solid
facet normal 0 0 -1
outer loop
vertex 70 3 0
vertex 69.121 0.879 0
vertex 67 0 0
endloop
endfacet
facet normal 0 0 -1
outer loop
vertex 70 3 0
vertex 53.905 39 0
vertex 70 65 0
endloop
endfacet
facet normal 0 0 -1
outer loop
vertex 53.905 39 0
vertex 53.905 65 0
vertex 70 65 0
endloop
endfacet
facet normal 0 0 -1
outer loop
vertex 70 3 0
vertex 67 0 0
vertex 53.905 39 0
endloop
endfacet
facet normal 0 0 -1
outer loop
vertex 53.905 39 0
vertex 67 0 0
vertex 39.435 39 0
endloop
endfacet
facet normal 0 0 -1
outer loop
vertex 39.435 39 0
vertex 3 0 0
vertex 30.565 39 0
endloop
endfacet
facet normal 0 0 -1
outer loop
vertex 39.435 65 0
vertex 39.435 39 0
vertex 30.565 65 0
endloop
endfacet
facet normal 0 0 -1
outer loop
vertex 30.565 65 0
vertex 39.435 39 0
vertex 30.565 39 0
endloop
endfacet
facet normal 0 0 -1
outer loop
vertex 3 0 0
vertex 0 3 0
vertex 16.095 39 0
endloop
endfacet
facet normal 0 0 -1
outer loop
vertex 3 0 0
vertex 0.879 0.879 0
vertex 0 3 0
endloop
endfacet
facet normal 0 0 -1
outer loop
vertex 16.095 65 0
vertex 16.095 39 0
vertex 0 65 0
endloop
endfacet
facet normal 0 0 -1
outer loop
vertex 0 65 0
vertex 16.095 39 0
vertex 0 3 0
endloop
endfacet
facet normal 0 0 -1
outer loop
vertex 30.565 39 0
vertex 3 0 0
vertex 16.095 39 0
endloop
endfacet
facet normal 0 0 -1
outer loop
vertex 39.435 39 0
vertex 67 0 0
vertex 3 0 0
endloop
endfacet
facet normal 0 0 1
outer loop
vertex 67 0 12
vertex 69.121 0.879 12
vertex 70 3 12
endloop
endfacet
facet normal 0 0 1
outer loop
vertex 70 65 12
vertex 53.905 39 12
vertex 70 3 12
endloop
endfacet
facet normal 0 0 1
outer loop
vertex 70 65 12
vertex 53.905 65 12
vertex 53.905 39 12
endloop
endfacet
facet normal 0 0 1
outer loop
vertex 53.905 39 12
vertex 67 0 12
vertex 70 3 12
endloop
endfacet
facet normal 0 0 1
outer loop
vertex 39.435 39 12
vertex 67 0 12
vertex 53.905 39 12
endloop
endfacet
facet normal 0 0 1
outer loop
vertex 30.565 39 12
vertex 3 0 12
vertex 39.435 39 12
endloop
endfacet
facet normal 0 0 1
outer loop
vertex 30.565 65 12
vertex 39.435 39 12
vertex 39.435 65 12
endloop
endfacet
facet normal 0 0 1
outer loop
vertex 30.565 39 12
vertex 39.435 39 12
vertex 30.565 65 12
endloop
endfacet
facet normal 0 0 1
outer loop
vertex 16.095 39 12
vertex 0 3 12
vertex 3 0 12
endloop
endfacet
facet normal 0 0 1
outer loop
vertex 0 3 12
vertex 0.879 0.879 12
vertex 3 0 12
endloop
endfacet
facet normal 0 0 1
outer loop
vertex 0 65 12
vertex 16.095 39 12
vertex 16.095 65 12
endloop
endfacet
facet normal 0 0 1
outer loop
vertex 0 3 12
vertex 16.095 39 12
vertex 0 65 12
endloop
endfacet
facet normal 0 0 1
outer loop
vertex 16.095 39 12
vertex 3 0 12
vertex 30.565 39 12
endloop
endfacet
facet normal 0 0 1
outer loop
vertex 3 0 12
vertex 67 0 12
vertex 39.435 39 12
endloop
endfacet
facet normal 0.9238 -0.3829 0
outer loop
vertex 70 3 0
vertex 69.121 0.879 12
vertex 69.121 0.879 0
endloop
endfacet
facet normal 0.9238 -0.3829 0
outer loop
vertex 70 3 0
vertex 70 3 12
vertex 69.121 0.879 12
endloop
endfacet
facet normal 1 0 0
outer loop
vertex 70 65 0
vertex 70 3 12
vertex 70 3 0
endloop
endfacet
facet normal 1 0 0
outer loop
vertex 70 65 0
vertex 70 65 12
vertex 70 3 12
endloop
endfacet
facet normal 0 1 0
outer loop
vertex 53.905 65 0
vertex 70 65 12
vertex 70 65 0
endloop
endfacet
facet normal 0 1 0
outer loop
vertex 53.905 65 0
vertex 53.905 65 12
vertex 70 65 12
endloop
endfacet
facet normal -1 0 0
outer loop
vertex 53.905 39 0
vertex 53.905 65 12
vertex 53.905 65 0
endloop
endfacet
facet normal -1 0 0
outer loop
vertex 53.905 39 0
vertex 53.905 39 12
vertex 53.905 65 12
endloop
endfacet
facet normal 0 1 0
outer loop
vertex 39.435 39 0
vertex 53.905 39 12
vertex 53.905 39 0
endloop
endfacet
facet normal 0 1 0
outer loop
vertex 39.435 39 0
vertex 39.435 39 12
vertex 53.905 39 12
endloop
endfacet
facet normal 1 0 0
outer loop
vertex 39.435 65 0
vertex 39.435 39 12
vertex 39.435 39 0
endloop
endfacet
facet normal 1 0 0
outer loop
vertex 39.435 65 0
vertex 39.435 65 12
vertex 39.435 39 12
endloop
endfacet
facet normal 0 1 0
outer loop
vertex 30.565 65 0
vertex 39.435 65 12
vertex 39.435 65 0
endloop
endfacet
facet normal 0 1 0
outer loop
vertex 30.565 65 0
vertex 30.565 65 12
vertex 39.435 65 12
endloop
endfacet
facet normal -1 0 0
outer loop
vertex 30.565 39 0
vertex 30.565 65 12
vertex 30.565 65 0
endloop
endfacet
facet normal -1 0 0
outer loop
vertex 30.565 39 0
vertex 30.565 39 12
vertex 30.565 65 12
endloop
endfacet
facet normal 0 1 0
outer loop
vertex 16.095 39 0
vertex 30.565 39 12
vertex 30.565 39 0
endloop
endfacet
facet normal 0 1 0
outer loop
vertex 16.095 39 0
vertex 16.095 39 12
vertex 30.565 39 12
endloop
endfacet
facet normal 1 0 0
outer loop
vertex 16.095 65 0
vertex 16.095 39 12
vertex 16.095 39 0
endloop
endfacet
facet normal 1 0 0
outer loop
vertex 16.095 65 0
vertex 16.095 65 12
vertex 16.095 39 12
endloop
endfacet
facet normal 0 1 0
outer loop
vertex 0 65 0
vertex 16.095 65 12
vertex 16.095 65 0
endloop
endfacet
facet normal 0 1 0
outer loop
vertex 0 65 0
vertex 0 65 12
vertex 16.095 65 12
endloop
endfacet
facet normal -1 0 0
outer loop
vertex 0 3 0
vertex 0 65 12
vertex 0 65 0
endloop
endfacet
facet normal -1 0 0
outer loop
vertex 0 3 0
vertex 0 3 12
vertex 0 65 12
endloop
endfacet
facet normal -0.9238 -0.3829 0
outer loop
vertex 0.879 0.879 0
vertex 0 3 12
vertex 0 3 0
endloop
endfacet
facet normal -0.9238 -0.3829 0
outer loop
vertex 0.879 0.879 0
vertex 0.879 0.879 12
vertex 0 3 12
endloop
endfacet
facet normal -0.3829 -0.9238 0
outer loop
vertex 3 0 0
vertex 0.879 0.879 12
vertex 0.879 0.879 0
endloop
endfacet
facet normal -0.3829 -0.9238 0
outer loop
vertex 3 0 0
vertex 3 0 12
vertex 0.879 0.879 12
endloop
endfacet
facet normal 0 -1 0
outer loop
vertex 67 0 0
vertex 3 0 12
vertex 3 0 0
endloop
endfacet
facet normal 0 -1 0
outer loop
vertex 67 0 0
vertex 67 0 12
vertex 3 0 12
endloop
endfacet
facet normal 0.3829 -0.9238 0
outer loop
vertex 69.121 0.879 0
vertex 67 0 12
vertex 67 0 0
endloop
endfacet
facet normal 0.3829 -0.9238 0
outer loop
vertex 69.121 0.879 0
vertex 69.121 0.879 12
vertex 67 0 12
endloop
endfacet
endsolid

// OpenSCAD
$fn = 32;

// ----------------------------------------------------------------------
// Window plate: 70 x 65 mm, 2 open windows
// ----------------------------------------------------------------------

// --- parameters (mm) ---
profile_height = 12;      // extrusion height
profile_points = 16;      // points of the closed outline

profile = [[0, 3], [0.879, 0.879], [3, 0], [67, 0], [69.121, 0.879], [70, 3], [70, 65], [53.905, 65], [53.905, 39], [39.435, 39], [39.435, 65], [30.565, 65], [30.565, 39], [16.095, 39], [16.095, 65], [0, 65]];  // single closed polygon, 16 points, counter clockwise

// --- the one profile operation ---
linear_extrude(height = profile_height) polygon(points = profile);
